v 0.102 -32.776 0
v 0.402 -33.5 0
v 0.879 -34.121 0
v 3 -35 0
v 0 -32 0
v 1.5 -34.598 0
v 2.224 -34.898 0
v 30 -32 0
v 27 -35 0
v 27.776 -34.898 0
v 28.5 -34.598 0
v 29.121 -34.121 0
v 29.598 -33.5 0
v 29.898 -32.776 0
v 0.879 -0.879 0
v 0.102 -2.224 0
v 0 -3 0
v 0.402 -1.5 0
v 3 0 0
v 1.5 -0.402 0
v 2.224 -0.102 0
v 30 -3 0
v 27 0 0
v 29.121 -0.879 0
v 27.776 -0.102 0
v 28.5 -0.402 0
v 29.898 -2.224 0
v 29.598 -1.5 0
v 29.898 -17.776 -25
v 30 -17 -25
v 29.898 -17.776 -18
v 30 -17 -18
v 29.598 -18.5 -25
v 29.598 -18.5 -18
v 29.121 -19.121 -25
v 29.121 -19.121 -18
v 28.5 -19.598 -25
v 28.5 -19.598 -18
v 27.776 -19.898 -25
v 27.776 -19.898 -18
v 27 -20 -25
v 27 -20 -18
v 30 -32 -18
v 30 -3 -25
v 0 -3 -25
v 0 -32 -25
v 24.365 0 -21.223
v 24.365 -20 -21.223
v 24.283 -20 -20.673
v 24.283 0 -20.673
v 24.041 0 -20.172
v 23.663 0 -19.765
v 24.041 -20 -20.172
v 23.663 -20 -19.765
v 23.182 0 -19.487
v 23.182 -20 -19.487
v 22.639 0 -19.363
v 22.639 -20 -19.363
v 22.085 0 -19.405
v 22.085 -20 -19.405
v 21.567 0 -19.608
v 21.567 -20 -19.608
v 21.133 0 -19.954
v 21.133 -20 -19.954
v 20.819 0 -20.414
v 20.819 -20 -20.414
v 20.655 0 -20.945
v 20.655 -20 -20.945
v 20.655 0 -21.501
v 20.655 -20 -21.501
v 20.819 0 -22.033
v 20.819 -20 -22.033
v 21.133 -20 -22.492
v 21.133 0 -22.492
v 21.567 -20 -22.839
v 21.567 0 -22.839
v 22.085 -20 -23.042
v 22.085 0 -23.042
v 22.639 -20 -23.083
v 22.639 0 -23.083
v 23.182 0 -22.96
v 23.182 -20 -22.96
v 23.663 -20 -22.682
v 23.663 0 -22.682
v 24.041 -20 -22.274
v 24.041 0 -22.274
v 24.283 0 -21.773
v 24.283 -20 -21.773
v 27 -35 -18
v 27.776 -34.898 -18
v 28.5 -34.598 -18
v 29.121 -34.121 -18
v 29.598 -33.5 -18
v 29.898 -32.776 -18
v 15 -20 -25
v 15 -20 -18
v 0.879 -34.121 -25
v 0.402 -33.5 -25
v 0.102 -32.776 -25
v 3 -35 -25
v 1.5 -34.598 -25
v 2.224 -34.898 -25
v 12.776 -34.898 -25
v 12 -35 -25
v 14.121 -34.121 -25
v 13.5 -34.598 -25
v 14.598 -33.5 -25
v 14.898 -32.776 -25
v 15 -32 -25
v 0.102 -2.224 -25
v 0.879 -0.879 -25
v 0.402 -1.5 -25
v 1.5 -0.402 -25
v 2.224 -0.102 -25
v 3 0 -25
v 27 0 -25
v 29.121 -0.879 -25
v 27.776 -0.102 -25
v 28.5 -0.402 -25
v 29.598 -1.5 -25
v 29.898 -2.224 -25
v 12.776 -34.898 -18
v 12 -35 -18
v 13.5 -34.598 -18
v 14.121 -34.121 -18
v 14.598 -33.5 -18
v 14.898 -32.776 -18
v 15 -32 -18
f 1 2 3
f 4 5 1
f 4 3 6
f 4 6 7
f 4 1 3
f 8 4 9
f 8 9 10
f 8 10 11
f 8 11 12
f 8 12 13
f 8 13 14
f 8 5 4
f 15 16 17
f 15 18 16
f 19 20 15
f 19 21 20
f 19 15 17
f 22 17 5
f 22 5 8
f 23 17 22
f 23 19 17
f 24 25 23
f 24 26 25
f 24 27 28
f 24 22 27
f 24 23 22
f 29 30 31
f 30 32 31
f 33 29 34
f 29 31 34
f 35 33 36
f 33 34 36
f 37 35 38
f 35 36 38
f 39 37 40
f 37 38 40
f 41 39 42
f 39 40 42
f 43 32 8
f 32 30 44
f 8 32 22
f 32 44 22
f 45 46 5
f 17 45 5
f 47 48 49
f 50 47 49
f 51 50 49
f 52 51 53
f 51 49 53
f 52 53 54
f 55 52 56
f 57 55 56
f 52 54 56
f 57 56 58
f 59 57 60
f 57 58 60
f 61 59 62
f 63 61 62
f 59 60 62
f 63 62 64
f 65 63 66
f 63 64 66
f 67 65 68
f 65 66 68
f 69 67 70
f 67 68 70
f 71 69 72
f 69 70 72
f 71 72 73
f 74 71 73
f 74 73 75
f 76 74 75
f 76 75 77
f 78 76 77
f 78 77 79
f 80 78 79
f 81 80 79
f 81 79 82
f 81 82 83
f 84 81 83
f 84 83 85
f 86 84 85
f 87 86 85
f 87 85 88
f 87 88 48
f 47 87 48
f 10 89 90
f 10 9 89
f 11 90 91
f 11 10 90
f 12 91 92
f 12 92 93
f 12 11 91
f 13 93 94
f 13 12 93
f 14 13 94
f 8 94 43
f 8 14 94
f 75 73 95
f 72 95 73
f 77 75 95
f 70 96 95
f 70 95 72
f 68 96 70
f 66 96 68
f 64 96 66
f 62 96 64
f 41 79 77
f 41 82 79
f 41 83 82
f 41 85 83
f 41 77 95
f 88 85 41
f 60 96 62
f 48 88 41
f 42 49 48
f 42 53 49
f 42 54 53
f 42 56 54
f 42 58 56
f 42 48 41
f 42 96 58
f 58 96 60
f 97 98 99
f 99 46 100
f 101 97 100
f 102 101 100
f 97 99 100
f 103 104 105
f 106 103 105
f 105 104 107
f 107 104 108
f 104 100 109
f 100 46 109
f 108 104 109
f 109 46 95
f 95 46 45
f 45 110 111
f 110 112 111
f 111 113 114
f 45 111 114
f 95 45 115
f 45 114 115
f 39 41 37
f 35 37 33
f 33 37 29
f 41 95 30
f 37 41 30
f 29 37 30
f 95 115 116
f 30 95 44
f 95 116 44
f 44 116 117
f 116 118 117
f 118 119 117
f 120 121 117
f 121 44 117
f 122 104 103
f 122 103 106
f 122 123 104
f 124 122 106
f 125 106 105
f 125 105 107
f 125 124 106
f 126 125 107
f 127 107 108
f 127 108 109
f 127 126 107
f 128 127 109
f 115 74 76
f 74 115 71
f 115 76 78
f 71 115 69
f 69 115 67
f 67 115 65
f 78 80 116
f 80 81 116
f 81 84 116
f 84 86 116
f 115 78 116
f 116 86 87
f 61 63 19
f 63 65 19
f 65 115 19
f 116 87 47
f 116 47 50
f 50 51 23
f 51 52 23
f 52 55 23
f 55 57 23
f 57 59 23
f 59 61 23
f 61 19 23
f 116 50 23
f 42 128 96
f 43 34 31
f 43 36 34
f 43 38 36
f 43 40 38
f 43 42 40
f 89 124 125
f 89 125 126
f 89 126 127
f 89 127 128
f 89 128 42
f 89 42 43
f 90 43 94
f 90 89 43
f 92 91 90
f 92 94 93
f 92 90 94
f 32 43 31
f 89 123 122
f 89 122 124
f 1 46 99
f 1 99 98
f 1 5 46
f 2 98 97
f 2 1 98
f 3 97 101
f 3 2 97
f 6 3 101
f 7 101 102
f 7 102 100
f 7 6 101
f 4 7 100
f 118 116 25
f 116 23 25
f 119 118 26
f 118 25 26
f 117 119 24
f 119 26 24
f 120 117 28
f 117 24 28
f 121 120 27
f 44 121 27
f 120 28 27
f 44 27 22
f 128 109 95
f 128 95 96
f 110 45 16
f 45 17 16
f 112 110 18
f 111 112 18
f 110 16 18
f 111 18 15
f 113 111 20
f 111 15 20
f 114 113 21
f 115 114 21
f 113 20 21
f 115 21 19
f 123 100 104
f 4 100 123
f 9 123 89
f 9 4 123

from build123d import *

# Parameters (mm, degrees)
F0_W     = 30
F0_H     = 25
F1_DEPTH = 35
F2_W     = 15
F2_H     = 7
F3_DEPTH = 15
F4_R     = 1.865436
F5_DEPTH = 20.001
F6_R     = 3


with BuildPart() as f1:
    # F0 (on Front) → F1 (new body)
    with BuildSketch(Plane.XZ):
        with Locations((15, -12.5)):
            Rectangle(F0_W, F0_H)
    extrude(amount=F1_DEPTH)

    # F2 (on face) → F3 (cut)
    with BuildSketch(Plane.XZ.offset(35)):
        with Locations((22.5, -21.5)):
            Rectangle(F2_W, F2_H)
    extrude(amount=-F3_DEPTH, mode=Mode.SUBTRACT)

    # F4 (on face) → F5 (cut, through all)
    with BuildSketch(Plane.XZ.offset(20)):
        with Locations((22.5, -21.223269)):
            Circle(F4_R)
    extrude(amount=-F5_DEPTH, mode=Mode.SUBTRACT)

    # F6
    f6_edges = [f1.edges().sort_by_distance(p)[0] for p in [
        (0, -35, -12.5),
        (15, -35, -21.5),
        (30, 0, -12.5),
        (30, -35, -9),
        (30, -20, -21.5),
        (0, 0, -12.5),
    ]]
    fillet(f6_edges, radius=F6_R)


solid = f1.part
